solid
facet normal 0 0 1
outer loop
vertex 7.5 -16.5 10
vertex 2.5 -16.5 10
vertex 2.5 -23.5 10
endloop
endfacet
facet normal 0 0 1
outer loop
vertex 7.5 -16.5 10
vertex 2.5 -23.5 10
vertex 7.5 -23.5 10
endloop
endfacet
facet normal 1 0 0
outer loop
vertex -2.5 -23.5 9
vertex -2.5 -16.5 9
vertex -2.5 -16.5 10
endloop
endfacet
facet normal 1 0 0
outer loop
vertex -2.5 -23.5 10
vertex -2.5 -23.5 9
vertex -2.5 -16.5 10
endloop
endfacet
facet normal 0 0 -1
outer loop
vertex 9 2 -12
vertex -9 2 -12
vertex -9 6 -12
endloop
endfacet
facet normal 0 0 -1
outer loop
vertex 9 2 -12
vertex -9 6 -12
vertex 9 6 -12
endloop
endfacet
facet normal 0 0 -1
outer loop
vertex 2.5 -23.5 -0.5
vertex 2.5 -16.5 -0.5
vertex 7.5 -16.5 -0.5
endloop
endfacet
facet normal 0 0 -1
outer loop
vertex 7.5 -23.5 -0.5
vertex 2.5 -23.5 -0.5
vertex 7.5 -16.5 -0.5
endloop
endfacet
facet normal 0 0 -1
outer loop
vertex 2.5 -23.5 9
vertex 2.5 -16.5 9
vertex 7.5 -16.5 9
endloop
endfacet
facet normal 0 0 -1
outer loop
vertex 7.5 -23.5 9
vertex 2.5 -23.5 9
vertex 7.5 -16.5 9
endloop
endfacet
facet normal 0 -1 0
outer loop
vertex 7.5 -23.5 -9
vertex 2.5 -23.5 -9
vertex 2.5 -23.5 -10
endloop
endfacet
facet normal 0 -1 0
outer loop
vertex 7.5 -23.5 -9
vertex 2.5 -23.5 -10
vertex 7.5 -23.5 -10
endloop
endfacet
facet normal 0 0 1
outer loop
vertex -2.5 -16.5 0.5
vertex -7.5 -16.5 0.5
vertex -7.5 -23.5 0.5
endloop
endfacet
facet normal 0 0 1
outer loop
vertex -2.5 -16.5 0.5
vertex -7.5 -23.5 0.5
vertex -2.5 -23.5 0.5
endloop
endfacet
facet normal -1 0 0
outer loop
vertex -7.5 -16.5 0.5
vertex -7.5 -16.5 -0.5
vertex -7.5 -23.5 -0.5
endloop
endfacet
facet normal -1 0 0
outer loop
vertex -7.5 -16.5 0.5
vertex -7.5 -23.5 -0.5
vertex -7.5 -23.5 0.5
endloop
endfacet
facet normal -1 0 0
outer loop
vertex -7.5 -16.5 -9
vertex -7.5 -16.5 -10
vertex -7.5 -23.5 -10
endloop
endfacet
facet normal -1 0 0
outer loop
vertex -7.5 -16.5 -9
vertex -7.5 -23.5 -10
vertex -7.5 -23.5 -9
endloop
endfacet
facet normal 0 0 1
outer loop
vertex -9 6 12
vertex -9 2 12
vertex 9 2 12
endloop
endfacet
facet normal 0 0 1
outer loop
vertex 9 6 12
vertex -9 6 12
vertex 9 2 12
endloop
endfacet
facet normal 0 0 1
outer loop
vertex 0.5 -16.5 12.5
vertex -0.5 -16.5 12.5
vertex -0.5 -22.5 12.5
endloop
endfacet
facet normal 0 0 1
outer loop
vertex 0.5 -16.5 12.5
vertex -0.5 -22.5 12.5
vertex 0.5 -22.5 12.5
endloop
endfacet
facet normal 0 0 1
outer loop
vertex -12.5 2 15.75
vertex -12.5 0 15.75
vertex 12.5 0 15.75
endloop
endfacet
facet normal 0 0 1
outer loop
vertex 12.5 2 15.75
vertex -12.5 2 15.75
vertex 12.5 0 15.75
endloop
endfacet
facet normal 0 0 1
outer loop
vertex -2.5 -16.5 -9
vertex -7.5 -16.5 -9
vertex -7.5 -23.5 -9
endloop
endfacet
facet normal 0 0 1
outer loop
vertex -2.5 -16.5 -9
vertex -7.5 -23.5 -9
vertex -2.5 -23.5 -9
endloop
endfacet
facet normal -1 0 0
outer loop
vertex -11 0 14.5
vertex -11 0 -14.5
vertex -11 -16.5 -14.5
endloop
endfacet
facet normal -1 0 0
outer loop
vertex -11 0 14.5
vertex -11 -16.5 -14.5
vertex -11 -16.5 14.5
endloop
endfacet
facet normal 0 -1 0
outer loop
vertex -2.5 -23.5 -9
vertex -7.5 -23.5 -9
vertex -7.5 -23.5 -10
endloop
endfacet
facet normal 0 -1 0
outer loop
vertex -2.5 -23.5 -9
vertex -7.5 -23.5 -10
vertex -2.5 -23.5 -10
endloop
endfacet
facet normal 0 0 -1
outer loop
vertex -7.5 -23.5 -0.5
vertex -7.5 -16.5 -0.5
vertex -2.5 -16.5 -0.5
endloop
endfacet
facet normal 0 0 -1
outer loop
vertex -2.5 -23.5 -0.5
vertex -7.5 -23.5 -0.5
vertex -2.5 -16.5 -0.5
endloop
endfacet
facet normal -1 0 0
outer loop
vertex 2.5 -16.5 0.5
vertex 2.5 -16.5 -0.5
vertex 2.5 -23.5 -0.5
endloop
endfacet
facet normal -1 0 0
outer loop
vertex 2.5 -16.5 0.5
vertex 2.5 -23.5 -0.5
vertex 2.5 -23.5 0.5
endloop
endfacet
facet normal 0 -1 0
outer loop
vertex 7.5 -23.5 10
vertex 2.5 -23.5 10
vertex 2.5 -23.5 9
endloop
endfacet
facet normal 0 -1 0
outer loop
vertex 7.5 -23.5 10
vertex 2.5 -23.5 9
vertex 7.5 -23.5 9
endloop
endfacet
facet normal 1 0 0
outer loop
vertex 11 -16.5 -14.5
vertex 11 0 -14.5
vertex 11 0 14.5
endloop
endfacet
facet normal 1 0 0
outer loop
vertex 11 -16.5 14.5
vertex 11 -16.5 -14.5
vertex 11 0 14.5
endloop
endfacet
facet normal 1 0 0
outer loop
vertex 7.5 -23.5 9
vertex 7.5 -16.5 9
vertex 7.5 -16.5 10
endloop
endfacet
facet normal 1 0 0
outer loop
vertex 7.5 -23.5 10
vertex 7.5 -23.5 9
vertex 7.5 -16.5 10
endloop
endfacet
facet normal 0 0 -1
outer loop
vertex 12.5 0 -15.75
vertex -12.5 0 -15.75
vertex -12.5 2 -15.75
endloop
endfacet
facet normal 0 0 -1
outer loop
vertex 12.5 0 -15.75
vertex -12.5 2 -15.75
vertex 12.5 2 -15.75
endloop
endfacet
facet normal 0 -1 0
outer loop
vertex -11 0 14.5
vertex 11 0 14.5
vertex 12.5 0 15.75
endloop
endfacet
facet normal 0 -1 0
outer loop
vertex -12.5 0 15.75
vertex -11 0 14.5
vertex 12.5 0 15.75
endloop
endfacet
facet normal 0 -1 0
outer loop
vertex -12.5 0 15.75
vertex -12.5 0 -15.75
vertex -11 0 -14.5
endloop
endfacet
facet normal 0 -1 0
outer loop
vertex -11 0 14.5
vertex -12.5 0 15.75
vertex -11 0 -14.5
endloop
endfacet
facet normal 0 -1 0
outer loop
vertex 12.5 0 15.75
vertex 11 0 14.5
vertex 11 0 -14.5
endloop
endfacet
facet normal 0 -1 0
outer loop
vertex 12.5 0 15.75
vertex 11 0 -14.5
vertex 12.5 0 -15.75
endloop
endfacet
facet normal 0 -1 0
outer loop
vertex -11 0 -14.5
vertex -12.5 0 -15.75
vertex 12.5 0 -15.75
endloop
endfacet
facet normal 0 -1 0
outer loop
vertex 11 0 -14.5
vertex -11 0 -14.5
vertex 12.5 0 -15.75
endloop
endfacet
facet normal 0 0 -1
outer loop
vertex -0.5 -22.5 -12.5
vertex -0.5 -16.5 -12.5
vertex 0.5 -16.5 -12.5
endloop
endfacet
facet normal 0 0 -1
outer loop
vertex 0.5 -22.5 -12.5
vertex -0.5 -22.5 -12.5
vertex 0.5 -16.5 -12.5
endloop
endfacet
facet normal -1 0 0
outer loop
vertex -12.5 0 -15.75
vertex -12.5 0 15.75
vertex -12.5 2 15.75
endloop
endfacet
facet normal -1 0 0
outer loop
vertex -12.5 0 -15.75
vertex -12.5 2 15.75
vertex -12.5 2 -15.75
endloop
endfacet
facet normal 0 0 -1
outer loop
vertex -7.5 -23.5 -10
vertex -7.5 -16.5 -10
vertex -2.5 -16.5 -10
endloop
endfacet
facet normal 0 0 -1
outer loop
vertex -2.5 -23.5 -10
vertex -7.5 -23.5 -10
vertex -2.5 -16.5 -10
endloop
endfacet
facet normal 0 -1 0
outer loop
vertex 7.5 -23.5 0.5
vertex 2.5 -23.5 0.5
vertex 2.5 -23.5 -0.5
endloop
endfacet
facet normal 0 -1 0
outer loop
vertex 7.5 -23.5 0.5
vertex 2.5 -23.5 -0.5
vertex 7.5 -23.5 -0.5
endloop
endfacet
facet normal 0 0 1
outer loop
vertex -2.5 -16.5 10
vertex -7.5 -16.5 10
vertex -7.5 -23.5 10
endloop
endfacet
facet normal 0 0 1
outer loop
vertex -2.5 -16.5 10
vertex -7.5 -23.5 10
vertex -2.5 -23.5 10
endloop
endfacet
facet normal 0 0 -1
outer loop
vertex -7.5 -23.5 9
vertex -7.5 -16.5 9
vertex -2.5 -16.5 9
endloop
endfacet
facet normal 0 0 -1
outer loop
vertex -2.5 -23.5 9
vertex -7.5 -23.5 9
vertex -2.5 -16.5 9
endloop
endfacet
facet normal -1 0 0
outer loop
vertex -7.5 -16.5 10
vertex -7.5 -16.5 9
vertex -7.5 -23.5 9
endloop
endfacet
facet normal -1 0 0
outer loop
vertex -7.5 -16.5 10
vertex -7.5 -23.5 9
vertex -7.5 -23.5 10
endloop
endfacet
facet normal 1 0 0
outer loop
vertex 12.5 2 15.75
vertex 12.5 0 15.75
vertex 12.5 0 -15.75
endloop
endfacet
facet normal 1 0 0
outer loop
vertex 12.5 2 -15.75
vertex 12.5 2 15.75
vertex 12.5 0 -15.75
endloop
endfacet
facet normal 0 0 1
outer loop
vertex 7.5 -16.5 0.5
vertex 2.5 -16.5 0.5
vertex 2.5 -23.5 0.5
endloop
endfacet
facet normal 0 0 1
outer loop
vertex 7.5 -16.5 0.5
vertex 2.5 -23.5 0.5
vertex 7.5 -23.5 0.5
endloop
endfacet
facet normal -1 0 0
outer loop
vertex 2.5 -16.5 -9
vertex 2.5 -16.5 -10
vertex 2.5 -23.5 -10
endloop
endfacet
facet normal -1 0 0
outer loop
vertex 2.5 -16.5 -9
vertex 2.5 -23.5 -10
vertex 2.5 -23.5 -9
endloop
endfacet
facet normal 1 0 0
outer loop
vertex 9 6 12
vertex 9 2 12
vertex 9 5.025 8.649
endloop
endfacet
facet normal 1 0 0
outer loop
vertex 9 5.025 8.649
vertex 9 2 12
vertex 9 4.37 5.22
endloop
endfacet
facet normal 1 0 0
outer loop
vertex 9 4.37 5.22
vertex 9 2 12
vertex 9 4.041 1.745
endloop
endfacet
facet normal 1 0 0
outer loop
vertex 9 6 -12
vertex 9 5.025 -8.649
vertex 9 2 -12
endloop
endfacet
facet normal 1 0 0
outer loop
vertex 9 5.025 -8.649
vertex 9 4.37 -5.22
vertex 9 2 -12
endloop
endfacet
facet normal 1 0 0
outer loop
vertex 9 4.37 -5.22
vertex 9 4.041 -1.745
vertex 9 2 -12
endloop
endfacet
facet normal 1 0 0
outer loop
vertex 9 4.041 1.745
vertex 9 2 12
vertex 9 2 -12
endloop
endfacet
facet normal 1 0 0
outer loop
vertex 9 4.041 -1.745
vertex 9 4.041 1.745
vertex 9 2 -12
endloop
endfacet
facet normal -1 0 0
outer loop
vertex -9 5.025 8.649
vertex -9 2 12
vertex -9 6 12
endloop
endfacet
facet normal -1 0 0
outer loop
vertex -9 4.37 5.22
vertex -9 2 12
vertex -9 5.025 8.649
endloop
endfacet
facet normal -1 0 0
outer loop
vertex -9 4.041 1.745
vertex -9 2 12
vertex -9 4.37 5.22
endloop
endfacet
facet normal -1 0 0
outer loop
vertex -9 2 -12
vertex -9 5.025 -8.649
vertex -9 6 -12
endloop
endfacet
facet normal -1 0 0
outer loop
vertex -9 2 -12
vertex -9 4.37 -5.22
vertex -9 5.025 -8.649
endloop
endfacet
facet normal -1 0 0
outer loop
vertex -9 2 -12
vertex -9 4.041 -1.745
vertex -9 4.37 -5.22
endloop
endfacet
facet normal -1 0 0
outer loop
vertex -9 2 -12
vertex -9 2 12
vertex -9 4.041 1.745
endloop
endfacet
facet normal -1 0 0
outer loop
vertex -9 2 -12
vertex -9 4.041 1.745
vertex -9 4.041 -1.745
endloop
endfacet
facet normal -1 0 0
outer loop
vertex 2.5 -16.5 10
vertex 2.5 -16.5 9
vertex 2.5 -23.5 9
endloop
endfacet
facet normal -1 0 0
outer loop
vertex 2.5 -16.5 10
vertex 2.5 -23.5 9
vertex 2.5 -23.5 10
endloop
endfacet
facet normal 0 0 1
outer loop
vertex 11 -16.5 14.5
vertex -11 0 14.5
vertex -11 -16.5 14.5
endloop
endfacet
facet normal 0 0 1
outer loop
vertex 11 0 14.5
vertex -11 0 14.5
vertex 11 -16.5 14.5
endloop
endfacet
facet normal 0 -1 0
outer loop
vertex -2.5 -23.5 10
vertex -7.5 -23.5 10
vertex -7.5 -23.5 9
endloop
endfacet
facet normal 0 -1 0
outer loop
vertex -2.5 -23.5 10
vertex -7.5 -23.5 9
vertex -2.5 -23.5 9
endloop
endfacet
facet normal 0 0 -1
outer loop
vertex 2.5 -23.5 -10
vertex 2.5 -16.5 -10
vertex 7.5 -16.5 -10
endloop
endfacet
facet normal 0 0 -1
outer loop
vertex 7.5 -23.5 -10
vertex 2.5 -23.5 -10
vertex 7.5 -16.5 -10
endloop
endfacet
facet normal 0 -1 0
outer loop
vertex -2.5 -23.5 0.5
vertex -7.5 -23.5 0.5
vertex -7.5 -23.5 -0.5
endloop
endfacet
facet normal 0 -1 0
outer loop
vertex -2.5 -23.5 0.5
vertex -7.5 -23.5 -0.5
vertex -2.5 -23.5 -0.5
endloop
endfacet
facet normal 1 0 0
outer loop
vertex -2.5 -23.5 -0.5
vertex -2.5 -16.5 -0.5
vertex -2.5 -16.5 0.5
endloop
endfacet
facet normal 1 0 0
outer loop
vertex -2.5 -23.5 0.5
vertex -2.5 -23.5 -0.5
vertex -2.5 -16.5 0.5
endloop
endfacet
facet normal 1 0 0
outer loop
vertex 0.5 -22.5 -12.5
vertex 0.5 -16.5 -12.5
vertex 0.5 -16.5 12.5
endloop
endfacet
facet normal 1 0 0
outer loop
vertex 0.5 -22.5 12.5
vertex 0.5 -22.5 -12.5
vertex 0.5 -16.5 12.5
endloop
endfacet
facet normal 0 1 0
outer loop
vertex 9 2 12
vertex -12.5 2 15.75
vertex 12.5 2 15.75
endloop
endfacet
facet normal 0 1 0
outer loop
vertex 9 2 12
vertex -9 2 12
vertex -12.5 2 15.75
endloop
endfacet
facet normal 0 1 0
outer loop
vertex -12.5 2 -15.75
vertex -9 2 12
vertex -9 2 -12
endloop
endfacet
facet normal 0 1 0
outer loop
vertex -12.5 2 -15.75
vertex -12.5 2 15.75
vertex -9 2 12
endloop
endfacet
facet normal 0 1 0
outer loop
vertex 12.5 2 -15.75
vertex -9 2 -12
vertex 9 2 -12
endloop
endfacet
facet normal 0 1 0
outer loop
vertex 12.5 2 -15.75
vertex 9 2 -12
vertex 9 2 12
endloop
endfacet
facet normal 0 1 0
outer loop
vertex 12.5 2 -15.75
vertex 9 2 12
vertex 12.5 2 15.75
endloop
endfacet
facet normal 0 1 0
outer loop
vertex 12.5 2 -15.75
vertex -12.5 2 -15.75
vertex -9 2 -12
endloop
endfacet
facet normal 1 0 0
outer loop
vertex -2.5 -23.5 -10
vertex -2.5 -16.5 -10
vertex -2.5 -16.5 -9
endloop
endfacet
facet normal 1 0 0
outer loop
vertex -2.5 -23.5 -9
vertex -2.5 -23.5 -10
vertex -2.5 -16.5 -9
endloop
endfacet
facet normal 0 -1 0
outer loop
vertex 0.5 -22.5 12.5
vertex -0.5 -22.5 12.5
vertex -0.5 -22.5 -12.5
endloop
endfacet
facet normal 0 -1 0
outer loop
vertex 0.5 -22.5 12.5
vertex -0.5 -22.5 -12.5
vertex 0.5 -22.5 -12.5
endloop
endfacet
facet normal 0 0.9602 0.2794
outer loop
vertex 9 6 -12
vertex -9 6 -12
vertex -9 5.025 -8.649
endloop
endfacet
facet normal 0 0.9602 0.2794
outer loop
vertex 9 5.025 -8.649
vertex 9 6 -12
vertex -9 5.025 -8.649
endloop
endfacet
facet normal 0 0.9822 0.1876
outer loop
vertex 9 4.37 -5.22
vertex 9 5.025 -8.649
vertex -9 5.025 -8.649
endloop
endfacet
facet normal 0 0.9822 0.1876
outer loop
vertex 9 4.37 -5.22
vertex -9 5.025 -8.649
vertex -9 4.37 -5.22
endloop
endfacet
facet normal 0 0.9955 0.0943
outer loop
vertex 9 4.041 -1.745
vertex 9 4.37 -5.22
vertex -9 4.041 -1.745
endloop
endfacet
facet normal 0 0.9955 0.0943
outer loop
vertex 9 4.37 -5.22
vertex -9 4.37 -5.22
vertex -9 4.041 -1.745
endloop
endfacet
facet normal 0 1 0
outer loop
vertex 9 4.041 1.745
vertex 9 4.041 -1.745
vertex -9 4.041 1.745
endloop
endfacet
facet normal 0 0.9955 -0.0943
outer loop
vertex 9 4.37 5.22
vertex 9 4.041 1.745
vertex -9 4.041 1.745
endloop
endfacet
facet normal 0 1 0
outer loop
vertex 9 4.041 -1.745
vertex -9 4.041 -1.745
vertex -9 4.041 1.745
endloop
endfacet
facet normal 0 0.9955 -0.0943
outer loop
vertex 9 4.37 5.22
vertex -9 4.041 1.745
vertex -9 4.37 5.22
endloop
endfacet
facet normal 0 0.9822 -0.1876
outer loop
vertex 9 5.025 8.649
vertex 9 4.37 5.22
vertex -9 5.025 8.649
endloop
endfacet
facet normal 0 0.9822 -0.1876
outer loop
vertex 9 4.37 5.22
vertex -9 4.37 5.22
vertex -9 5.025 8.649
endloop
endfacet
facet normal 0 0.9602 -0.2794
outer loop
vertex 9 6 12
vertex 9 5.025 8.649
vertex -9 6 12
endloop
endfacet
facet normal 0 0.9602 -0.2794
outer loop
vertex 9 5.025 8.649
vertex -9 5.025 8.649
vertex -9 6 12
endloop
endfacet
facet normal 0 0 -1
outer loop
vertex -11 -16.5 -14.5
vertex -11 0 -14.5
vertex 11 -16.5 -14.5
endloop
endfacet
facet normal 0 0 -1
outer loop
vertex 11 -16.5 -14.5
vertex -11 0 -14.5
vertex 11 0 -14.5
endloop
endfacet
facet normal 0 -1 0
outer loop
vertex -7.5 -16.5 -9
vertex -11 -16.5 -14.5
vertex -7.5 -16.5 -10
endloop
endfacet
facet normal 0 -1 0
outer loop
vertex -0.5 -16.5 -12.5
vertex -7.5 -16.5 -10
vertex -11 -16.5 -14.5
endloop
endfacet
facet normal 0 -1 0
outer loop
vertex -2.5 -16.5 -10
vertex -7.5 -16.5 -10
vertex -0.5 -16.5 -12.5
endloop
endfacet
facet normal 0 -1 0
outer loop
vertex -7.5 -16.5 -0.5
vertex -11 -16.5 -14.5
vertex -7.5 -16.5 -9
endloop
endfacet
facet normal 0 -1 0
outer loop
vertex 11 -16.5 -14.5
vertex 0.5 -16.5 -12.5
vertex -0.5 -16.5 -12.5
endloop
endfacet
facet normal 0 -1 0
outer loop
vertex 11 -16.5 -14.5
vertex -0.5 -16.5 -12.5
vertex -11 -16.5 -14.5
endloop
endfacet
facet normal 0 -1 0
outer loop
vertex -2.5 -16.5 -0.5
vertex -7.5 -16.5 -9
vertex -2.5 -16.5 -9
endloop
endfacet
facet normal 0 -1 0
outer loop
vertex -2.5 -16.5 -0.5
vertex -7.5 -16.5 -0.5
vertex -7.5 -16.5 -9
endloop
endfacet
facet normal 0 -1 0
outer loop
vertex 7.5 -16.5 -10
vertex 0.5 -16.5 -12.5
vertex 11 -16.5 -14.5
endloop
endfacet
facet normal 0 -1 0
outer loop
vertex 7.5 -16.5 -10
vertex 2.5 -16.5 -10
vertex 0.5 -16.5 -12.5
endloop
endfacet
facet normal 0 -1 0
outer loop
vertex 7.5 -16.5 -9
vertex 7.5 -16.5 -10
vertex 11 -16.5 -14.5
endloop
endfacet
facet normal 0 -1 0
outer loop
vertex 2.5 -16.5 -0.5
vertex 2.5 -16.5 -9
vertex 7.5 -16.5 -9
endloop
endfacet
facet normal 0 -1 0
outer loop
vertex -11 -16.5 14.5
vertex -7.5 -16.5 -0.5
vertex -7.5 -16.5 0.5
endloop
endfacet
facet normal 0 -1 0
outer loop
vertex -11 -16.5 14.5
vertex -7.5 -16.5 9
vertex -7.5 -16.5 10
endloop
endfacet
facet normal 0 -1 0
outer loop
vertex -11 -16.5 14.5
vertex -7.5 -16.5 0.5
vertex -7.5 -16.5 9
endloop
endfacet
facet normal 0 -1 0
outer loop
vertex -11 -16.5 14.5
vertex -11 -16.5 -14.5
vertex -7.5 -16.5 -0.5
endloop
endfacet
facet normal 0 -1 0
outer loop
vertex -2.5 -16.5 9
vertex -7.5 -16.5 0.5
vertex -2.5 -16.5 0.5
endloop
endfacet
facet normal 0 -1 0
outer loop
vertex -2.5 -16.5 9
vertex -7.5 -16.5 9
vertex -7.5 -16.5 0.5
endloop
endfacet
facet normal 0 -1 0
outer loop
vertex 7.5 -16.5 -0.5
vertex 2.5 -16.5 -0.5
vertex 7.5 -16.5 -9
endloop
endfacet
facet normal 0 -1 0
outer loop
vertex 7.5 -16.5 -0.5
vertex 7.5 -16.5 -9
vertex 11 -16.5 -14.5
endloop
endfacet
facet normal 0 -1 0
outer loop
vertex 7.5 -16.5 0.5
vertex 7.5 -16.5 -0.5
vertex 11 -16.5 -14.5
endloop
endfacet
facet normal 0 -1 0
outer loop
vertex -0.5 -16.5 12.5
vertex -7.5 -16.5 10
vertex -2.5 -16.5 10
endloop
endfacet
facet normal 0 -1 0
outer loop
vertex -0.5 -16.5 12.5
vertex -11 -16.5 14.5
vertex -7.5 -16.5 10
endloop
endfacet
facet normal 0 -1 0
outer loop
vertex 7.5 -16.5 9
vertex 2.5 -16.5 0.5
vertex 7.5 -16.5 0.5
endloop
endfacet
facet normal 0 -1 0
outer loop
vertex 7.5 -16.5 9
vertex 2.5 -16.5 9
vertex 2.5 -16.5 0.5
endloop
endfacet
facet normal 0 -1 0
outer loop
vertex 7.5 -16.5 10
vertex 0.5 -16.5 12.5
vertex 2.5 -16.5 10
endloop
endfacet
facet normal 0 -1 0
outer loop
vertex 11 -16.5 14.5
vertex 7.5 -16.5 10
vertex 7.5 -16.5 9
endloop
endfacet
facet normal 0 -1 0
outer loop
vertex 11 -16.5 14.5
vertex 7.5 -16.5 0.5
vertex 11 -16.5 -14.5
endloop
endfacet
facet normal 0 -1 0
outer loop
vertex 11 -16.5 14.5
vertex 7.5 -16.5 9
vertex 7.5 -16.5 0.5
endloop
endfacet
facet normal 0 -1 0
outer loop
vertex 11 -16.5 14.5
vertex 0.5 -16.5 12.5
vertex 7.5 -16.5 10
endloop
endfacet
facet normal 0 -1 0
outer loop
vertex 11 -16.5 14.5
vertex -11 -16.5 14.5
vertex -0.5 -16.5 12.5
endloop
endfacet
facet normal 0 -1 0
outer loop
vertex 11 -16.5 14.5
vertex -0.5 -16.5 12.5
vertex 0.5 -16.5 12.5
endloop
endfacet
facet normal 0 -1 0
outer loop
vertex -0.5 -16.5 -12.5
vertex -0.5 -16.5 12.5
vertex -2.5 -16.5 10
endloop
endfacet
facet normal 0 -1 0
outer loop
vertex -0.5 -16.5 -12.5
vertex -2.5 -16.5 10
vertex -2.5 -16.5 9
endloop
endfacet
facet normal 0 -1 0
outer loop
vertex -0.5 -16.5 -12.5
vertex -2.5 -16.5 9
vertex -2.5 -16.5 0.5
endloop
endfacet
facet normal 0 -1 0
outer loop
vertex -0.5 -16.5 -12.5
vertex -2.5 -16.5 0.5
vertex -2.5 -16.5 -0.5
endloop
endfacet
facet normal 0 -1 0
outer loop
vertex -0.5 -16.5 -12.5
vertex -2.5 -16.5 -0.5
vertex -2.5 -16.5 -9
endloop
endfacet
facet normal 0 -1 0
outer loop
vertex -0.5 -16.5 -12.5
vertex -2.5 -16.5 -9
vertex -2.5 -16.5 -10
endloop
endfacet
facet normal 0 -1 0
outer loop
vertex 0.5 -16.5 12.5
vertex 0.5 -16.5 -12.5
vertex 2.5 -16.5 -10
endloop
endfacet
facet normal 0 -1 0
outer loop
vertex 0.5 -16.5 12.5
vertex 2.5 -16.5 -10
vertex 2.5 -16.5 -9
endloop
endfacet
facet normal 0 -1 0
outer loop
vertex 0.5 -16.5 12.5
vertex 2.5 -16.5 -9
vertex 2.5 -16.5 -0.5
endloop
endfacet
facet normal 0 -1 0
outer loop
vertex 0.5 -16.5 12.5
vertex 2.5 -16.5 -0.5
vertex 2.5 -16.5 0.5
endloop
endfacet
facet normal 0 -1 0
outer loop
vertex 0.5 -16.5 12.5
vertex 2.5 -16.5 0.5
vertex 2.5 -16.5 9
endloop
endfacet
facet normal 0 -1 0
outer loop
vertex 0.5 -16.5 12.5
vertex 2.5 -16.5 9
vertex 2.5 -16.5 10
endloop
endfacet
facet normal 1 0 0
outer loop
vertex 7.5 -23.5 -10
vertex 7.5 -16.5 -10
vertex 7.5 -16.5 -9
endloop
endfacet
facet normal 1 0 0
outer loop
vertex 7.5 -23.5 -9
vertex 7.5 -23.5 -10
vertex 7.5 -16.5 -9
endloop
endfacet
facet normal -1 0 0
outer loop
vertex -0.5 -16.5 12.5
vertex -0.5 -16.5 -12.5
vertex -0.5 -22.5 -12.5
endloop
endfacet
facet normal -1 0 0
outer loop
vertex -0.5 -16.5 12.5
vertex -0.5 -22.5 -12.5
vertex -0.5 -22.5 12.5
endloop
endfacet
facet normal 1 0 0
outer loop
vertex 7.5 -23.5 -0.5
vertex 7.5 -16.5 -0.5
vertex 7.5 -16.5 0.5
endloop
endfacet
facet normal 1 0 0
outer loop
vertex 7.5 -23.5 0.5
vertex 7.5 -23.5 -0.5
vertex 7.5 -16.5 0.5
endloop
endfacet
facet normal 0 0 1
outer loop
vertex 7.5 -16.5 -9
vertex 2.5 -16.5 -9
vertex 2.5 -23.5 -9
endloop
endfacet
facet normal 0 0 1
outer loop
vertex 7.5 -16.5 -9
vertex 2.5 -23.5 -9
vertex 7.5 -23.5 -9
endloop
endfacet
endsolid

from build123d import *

# Parameters (mm, degrees)
SKIZZE1_W                       = 25
SKIZZE1_H                       = 31.5
AUFSATZ_LINEAR_AUSTRAGEN1_DEPTH = 2
SKIZZE2_W                       = 22
SKIZZE2_H                       = 29
AUFSATZ_LINEAR_AUSTRAGEN2_DEPTH = 16.5
SKIZZE3_W                       = 1
SKIZZE3_H                       = 25
AUFSATZ_LINEAR_AUSTRAGEN3_DEPTH = 6
SKIZZE4_W                       = 5
SKIZZE4_H                       = 1
AUFSATZ_LINEAR_AUSTRAGEN4_DEPTH = 7
SKIZZE5_W                       = 18
SKIZZE5_H                       = 24
AUFSATZ_LINEAR_AUSTRAGEN5_DEPTH = 4
SKIZZE6_R                       = 37
SCHNITT_LINEAR_AUSTRAGEN1_DEPTH = 36.532555495


with BuildPart() as part:
    # Skizze1 → Aufsatz-Linear austragen1 (new body)
    with BuildSketch(Plane(origin=(0, 0, 0), x_dir=(1, 0, 0), z_dir=(0, 1, 0))):
        Rectangle(SKIZZE1_W, SKIZZE1_H)
    extrude(amount=AUFSATZ_LINEAR_AUSTRAGEN1_DEPTH)

    # Skizze2 → Aufsatz-Linear austragen2 (add)
    with BuildSketch(Plane.XZ):
        Rectangle(SKIZZE2_W, SKIZZE2_H)
    extrude(amount=AUFSATZ_LINEAR_AUSTRAGEN2_DEPTH)

    # Skizze3 → Aufsatz-Linear austragen3 (add)
    with BuildSketch(Plane.XZ.offset(16.5)):
        Rectangle(SKIZZE3_W, SKIZZE3_H)
    extrude(amount=AUFSATZ_LINEAR_AUSTRAGEN3_DEPTH)

    # Skizze4 → Aufsatz-Linear austragen4 (add)
    with BuildSketch(Plane.XZ.offset(16.5)):
        with Locations((-5, 9.5)):
            Rectangle(SKIZZE4_W, SKIZZE4_H)
        with Locations((-5, 0)):
            Rectangle(SKIZZE4_W, SKIZZE4_H)
        with Locations((-5, -9.5)):
            Rectangle(SKIZZE4_W, SKIZZE4_H)
        with Locations((5, -9.5)):
            Rectangle(SKIZZE4_W, SKIZZE4_H)
        with Locations((5, 0)):
            Rectangle(SKIZZE4_W, SKIZZE4_H)
        with Locations((5, 9.5)):
            Rectangle(SKIZZE4_W, SKIZZE4_H)
    extrude(amount=AUFSATZ_LINEAR_AUSTRAGEN4_DEPTH)

    # Skizze5 → Aufsatz-Linear austragen5 (add)
    with BuildSketch(Plane(origin=(0, 2, 0), x_dir=(1, 0, 0), z_dir=(0, 1, 0))):
        Rectangle(SKIZZE5_W, SKIZZE5_H)
    extrude(amount=AUFSATZ_LINEAR_AUSTRAGEN5_DEPTH)

    # Skizze6 → Schnitt-Linear austragen1 (cut, through all)
    with BuildSketch(Plane.ZY.offset(9)):
        with Locations((0, 41)):
            Circle(SKIZZE6_R)
    extrude(amount=-SCHNITT_LINEAR_AUSTRAGEN1_DEPTH, mode=Mode.SUBTRACT)


solid = part.part
